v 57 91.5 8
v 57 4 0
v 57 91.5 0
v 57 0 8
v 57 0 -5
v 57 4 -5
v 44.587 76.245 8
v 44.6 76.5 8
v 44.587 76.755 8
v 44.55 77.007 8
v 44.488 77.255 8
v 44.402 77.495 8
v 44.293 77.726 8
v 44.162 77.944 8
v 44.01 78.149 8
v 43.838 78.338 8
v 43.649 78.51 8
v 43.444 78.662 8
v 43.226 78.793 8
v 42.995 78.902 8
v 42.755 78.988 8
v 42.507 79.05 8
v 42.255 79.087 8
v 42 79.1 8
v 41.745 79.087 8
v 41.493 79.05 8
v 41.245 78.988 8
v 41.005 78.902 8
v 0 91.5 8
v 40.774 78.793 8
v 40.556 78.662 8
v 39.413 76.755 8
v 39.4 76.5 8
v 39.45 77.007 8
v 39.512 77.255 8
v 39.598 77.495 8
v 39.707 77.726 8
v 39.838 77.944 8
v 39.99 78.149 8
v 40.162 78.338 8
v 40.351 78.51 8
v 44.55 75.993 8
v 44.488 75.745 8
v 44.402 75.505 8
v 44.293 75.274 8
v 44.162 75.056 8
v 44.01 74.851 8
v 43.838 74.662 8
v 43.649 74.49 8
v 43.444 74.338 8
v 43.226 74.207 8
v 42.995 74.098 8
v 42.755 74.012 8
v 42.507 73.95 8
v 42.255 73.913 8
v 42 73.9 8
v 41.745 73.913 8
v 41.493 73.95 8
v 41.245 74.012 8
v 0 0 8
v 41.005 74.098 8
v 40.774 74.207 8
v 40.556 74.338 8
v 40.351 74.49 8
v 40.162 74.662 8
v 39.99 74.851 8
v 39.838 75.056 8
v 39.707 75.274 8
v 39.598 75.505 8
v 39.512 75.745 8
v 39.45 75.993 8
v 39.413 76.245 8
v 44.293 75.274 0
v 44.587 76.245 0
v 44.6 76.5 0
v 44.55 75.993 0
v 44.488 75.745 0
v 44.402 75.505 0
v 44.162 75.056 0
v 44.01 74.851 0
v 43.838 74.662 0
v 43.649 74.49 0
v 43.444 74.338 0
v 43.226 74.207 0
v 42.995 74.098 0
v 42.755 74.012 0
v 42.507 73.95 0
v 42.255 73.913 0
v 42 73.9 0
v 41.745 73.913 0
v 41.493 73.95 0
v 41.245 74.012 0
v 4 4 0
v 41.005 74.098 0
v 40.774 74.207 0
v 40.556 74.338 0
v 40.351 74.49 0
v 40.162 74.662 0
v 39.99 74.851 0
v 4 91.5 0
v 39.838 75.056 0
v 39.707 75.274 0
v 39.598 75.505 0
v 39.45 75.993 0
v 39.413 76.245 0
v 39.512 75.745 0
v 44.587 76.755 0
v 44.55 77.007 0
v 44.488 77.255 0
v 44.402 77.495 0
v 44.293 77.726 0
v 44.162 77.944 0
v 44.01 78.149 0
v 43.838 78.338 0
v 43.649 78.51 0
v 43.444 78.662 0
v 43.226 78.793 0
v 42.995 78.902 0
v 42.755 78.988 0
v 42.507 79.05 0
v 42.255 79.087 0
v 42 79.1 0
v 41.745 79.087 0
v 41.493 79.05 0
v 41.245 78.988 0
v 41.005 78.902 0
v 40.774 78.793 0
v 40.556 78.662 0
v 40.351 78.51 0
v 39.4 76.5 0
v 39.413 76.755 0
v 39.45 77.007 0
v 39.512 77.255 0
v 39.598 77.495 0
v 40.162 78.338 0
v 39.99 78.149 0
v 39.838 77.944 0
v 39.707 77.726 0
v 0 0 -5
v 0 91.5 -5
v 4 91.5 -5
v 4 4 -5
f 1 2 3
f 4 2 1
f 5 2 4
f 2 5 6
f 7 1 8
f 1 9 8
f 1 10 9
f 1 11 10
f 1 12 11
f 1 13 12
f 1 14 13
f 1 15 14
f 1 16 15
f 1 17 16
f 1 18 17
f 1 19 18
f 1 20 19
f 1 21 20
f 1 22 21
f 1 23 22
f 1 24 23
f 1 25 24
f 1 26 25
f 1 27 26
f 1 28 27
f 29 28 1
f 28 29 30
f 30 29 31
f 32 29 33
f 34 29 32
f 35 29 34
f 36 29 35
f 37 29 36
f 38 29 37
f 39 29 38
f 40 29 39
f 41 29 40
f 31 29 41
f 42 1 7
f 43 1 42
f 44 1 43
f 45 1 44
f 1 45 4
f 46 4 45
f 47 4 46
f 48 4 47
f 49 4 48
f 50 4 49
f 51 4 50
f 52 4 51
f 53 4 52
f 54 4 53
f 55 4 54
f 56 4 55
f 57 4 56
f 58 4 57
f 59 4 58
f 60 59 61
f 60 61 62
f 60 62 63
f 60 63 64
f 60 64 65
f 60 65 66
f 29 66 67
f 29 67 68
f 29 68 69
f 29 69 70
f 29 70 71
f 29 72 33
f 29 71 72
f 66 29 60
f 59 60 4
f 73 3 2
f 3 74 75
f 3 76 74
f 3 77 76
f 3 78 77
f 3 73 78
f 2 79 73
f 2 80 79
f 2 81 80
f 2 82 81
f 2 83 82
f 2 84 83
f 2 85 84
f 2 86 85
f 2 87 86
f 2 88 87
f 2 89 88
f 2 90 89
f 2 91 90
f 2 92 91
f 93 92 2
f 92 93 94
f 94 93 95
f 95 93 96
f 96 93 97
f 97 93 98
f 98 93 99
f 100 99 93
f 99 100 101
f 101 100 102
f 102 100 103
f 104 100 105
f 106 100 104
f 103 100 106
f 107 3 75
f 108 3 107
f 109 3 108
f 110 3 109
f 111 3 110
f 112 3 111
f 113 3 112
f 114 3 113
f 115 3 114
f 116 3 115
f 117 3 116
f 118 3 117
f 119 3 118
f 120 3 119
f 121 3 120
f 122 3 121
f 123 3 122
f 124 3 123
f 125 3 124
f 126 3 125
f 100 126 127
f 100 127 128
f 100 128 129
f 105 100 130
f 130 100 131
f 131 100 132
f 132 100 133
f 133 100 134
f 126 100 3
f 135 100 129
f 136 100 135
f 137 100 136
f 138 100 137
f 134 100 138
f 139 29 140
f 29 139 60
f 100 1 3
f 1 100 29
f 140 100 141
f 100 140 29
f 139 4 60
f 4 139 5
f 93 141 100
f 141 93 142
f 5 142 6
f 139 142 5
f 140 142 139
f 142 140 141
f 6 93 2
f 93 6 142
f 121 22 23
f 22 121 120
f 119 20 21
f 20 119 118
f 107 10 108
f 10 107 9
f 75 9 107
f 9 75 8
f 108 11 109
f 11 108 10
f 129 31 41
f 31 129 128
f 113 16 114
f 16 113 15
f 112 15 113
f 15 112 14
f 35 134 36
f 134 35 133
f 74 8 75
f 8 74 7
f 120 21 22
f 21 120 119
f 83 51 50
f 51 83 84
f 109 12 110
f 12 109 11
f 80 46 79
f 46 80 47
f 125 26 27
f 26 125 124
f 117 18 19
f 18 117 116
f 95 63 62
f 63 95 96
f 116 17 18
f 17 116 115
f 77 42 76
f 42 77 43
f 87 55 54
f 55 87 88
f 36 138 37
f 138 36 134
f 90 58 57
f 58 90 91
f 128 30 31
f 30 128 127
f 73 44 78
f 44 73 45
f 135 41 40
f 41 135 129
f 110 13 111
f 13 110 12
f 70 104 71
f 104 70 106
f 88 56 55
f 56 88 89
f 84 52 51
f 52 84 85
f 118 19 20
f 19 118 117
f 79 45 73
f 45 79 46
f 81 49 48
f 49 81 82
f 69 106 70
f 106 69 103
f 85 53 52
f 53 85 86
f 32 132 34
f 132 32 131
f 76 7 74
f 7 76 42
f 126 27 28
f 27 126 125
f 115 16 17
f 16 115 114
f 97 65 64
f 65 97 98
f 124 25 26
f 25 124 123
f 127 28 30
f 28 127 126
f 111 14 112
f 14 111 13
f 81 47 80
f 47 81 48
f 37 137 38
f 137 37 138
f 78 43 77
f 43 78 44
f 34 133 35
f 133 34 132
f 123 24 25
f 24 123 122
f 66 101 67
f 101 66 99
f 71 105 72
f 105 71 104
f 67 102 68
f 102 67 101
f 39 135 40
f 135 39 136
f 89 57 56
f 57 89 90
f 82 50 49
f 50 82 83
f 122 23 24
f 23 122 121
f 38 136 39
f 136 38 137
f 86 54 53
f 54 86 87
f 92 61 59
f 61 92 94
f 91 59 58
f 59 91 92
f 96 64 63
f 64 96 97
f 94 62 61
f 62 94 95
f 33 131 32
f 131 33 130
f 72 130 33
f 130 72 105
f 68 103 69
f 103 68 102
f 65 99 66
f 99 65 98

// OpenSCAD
// ============================================================
//  Corner Drill Jig
//  L-shaped jig that registers against a metal sheet corner
//  and guides a 5 mm drill bit to the exact position.
// ============================================================

// ---------- Parameters ----------

hole_d    = 5.0;   // nominal drill bit diameter [mm]
clearance = 0.2;   // radial clearance added to guide hole [mm]

// Distance from each flange's inner wall to the hole centre
hole_x    = 38.0;  // distance from flange-A (the "left" wall) [mm]
hole_y    = 72.5;  // distance from flange-B (the "bottom" wall) [mm]

plate_h   =  8;    // total height of the guide plate [mm]
flange_h  =  5;    // depth the flanges extend BELOW the plate (grips sheet edge) [mm]
flange_w  =  4;    // wall thickness of each flange [mm]

margin_x  = 15;    // extra plate material beyond hole centre in X [mm]
margin_y  = 15;    // extra plate material beyond hole centre in Y [mm]

// ---------- Derived dimensions ----------

// Total plate footprint:
//   X: flange_w (left wall) + hole_x + margin_x
//   Y: flange_w (bottom wall) + hole_y + margin_y
plate_x = flange_w + hole_x + margin_x;
plate_y = flange_w + hole_y + margin_y;

guide_r = (hole_d + clearance) / 2;

$fn = 64;

// ---------- Main body ----------

difference() {
    union() {
        // Flat guide plate (sits on top of the sheet)
        cube([plate_x, plate_y, plate_h]);

        // Flange A — along the left edge (registers against sheet edge in X)
        translate([0, 0, -flange_h])
            cube([flange_w, plate_y, flange_h]);

        // Flange B — along the bottom edge (registers against sheet edge in Y)
        translate([0, 0, -flange_h])
            cube([plate_x, flange_w, flange_h]);
    }

    // Drill guide hole — centred at (hole_x, hole_y) from the inner corner
    //   inner corner = (flange_w, flange_w) in plate coordinates
    translate([flange_w + hole_x, flange_w + hole_y, -1])
        cylinder(r = guide_r, h = plate_h + 2);
}
